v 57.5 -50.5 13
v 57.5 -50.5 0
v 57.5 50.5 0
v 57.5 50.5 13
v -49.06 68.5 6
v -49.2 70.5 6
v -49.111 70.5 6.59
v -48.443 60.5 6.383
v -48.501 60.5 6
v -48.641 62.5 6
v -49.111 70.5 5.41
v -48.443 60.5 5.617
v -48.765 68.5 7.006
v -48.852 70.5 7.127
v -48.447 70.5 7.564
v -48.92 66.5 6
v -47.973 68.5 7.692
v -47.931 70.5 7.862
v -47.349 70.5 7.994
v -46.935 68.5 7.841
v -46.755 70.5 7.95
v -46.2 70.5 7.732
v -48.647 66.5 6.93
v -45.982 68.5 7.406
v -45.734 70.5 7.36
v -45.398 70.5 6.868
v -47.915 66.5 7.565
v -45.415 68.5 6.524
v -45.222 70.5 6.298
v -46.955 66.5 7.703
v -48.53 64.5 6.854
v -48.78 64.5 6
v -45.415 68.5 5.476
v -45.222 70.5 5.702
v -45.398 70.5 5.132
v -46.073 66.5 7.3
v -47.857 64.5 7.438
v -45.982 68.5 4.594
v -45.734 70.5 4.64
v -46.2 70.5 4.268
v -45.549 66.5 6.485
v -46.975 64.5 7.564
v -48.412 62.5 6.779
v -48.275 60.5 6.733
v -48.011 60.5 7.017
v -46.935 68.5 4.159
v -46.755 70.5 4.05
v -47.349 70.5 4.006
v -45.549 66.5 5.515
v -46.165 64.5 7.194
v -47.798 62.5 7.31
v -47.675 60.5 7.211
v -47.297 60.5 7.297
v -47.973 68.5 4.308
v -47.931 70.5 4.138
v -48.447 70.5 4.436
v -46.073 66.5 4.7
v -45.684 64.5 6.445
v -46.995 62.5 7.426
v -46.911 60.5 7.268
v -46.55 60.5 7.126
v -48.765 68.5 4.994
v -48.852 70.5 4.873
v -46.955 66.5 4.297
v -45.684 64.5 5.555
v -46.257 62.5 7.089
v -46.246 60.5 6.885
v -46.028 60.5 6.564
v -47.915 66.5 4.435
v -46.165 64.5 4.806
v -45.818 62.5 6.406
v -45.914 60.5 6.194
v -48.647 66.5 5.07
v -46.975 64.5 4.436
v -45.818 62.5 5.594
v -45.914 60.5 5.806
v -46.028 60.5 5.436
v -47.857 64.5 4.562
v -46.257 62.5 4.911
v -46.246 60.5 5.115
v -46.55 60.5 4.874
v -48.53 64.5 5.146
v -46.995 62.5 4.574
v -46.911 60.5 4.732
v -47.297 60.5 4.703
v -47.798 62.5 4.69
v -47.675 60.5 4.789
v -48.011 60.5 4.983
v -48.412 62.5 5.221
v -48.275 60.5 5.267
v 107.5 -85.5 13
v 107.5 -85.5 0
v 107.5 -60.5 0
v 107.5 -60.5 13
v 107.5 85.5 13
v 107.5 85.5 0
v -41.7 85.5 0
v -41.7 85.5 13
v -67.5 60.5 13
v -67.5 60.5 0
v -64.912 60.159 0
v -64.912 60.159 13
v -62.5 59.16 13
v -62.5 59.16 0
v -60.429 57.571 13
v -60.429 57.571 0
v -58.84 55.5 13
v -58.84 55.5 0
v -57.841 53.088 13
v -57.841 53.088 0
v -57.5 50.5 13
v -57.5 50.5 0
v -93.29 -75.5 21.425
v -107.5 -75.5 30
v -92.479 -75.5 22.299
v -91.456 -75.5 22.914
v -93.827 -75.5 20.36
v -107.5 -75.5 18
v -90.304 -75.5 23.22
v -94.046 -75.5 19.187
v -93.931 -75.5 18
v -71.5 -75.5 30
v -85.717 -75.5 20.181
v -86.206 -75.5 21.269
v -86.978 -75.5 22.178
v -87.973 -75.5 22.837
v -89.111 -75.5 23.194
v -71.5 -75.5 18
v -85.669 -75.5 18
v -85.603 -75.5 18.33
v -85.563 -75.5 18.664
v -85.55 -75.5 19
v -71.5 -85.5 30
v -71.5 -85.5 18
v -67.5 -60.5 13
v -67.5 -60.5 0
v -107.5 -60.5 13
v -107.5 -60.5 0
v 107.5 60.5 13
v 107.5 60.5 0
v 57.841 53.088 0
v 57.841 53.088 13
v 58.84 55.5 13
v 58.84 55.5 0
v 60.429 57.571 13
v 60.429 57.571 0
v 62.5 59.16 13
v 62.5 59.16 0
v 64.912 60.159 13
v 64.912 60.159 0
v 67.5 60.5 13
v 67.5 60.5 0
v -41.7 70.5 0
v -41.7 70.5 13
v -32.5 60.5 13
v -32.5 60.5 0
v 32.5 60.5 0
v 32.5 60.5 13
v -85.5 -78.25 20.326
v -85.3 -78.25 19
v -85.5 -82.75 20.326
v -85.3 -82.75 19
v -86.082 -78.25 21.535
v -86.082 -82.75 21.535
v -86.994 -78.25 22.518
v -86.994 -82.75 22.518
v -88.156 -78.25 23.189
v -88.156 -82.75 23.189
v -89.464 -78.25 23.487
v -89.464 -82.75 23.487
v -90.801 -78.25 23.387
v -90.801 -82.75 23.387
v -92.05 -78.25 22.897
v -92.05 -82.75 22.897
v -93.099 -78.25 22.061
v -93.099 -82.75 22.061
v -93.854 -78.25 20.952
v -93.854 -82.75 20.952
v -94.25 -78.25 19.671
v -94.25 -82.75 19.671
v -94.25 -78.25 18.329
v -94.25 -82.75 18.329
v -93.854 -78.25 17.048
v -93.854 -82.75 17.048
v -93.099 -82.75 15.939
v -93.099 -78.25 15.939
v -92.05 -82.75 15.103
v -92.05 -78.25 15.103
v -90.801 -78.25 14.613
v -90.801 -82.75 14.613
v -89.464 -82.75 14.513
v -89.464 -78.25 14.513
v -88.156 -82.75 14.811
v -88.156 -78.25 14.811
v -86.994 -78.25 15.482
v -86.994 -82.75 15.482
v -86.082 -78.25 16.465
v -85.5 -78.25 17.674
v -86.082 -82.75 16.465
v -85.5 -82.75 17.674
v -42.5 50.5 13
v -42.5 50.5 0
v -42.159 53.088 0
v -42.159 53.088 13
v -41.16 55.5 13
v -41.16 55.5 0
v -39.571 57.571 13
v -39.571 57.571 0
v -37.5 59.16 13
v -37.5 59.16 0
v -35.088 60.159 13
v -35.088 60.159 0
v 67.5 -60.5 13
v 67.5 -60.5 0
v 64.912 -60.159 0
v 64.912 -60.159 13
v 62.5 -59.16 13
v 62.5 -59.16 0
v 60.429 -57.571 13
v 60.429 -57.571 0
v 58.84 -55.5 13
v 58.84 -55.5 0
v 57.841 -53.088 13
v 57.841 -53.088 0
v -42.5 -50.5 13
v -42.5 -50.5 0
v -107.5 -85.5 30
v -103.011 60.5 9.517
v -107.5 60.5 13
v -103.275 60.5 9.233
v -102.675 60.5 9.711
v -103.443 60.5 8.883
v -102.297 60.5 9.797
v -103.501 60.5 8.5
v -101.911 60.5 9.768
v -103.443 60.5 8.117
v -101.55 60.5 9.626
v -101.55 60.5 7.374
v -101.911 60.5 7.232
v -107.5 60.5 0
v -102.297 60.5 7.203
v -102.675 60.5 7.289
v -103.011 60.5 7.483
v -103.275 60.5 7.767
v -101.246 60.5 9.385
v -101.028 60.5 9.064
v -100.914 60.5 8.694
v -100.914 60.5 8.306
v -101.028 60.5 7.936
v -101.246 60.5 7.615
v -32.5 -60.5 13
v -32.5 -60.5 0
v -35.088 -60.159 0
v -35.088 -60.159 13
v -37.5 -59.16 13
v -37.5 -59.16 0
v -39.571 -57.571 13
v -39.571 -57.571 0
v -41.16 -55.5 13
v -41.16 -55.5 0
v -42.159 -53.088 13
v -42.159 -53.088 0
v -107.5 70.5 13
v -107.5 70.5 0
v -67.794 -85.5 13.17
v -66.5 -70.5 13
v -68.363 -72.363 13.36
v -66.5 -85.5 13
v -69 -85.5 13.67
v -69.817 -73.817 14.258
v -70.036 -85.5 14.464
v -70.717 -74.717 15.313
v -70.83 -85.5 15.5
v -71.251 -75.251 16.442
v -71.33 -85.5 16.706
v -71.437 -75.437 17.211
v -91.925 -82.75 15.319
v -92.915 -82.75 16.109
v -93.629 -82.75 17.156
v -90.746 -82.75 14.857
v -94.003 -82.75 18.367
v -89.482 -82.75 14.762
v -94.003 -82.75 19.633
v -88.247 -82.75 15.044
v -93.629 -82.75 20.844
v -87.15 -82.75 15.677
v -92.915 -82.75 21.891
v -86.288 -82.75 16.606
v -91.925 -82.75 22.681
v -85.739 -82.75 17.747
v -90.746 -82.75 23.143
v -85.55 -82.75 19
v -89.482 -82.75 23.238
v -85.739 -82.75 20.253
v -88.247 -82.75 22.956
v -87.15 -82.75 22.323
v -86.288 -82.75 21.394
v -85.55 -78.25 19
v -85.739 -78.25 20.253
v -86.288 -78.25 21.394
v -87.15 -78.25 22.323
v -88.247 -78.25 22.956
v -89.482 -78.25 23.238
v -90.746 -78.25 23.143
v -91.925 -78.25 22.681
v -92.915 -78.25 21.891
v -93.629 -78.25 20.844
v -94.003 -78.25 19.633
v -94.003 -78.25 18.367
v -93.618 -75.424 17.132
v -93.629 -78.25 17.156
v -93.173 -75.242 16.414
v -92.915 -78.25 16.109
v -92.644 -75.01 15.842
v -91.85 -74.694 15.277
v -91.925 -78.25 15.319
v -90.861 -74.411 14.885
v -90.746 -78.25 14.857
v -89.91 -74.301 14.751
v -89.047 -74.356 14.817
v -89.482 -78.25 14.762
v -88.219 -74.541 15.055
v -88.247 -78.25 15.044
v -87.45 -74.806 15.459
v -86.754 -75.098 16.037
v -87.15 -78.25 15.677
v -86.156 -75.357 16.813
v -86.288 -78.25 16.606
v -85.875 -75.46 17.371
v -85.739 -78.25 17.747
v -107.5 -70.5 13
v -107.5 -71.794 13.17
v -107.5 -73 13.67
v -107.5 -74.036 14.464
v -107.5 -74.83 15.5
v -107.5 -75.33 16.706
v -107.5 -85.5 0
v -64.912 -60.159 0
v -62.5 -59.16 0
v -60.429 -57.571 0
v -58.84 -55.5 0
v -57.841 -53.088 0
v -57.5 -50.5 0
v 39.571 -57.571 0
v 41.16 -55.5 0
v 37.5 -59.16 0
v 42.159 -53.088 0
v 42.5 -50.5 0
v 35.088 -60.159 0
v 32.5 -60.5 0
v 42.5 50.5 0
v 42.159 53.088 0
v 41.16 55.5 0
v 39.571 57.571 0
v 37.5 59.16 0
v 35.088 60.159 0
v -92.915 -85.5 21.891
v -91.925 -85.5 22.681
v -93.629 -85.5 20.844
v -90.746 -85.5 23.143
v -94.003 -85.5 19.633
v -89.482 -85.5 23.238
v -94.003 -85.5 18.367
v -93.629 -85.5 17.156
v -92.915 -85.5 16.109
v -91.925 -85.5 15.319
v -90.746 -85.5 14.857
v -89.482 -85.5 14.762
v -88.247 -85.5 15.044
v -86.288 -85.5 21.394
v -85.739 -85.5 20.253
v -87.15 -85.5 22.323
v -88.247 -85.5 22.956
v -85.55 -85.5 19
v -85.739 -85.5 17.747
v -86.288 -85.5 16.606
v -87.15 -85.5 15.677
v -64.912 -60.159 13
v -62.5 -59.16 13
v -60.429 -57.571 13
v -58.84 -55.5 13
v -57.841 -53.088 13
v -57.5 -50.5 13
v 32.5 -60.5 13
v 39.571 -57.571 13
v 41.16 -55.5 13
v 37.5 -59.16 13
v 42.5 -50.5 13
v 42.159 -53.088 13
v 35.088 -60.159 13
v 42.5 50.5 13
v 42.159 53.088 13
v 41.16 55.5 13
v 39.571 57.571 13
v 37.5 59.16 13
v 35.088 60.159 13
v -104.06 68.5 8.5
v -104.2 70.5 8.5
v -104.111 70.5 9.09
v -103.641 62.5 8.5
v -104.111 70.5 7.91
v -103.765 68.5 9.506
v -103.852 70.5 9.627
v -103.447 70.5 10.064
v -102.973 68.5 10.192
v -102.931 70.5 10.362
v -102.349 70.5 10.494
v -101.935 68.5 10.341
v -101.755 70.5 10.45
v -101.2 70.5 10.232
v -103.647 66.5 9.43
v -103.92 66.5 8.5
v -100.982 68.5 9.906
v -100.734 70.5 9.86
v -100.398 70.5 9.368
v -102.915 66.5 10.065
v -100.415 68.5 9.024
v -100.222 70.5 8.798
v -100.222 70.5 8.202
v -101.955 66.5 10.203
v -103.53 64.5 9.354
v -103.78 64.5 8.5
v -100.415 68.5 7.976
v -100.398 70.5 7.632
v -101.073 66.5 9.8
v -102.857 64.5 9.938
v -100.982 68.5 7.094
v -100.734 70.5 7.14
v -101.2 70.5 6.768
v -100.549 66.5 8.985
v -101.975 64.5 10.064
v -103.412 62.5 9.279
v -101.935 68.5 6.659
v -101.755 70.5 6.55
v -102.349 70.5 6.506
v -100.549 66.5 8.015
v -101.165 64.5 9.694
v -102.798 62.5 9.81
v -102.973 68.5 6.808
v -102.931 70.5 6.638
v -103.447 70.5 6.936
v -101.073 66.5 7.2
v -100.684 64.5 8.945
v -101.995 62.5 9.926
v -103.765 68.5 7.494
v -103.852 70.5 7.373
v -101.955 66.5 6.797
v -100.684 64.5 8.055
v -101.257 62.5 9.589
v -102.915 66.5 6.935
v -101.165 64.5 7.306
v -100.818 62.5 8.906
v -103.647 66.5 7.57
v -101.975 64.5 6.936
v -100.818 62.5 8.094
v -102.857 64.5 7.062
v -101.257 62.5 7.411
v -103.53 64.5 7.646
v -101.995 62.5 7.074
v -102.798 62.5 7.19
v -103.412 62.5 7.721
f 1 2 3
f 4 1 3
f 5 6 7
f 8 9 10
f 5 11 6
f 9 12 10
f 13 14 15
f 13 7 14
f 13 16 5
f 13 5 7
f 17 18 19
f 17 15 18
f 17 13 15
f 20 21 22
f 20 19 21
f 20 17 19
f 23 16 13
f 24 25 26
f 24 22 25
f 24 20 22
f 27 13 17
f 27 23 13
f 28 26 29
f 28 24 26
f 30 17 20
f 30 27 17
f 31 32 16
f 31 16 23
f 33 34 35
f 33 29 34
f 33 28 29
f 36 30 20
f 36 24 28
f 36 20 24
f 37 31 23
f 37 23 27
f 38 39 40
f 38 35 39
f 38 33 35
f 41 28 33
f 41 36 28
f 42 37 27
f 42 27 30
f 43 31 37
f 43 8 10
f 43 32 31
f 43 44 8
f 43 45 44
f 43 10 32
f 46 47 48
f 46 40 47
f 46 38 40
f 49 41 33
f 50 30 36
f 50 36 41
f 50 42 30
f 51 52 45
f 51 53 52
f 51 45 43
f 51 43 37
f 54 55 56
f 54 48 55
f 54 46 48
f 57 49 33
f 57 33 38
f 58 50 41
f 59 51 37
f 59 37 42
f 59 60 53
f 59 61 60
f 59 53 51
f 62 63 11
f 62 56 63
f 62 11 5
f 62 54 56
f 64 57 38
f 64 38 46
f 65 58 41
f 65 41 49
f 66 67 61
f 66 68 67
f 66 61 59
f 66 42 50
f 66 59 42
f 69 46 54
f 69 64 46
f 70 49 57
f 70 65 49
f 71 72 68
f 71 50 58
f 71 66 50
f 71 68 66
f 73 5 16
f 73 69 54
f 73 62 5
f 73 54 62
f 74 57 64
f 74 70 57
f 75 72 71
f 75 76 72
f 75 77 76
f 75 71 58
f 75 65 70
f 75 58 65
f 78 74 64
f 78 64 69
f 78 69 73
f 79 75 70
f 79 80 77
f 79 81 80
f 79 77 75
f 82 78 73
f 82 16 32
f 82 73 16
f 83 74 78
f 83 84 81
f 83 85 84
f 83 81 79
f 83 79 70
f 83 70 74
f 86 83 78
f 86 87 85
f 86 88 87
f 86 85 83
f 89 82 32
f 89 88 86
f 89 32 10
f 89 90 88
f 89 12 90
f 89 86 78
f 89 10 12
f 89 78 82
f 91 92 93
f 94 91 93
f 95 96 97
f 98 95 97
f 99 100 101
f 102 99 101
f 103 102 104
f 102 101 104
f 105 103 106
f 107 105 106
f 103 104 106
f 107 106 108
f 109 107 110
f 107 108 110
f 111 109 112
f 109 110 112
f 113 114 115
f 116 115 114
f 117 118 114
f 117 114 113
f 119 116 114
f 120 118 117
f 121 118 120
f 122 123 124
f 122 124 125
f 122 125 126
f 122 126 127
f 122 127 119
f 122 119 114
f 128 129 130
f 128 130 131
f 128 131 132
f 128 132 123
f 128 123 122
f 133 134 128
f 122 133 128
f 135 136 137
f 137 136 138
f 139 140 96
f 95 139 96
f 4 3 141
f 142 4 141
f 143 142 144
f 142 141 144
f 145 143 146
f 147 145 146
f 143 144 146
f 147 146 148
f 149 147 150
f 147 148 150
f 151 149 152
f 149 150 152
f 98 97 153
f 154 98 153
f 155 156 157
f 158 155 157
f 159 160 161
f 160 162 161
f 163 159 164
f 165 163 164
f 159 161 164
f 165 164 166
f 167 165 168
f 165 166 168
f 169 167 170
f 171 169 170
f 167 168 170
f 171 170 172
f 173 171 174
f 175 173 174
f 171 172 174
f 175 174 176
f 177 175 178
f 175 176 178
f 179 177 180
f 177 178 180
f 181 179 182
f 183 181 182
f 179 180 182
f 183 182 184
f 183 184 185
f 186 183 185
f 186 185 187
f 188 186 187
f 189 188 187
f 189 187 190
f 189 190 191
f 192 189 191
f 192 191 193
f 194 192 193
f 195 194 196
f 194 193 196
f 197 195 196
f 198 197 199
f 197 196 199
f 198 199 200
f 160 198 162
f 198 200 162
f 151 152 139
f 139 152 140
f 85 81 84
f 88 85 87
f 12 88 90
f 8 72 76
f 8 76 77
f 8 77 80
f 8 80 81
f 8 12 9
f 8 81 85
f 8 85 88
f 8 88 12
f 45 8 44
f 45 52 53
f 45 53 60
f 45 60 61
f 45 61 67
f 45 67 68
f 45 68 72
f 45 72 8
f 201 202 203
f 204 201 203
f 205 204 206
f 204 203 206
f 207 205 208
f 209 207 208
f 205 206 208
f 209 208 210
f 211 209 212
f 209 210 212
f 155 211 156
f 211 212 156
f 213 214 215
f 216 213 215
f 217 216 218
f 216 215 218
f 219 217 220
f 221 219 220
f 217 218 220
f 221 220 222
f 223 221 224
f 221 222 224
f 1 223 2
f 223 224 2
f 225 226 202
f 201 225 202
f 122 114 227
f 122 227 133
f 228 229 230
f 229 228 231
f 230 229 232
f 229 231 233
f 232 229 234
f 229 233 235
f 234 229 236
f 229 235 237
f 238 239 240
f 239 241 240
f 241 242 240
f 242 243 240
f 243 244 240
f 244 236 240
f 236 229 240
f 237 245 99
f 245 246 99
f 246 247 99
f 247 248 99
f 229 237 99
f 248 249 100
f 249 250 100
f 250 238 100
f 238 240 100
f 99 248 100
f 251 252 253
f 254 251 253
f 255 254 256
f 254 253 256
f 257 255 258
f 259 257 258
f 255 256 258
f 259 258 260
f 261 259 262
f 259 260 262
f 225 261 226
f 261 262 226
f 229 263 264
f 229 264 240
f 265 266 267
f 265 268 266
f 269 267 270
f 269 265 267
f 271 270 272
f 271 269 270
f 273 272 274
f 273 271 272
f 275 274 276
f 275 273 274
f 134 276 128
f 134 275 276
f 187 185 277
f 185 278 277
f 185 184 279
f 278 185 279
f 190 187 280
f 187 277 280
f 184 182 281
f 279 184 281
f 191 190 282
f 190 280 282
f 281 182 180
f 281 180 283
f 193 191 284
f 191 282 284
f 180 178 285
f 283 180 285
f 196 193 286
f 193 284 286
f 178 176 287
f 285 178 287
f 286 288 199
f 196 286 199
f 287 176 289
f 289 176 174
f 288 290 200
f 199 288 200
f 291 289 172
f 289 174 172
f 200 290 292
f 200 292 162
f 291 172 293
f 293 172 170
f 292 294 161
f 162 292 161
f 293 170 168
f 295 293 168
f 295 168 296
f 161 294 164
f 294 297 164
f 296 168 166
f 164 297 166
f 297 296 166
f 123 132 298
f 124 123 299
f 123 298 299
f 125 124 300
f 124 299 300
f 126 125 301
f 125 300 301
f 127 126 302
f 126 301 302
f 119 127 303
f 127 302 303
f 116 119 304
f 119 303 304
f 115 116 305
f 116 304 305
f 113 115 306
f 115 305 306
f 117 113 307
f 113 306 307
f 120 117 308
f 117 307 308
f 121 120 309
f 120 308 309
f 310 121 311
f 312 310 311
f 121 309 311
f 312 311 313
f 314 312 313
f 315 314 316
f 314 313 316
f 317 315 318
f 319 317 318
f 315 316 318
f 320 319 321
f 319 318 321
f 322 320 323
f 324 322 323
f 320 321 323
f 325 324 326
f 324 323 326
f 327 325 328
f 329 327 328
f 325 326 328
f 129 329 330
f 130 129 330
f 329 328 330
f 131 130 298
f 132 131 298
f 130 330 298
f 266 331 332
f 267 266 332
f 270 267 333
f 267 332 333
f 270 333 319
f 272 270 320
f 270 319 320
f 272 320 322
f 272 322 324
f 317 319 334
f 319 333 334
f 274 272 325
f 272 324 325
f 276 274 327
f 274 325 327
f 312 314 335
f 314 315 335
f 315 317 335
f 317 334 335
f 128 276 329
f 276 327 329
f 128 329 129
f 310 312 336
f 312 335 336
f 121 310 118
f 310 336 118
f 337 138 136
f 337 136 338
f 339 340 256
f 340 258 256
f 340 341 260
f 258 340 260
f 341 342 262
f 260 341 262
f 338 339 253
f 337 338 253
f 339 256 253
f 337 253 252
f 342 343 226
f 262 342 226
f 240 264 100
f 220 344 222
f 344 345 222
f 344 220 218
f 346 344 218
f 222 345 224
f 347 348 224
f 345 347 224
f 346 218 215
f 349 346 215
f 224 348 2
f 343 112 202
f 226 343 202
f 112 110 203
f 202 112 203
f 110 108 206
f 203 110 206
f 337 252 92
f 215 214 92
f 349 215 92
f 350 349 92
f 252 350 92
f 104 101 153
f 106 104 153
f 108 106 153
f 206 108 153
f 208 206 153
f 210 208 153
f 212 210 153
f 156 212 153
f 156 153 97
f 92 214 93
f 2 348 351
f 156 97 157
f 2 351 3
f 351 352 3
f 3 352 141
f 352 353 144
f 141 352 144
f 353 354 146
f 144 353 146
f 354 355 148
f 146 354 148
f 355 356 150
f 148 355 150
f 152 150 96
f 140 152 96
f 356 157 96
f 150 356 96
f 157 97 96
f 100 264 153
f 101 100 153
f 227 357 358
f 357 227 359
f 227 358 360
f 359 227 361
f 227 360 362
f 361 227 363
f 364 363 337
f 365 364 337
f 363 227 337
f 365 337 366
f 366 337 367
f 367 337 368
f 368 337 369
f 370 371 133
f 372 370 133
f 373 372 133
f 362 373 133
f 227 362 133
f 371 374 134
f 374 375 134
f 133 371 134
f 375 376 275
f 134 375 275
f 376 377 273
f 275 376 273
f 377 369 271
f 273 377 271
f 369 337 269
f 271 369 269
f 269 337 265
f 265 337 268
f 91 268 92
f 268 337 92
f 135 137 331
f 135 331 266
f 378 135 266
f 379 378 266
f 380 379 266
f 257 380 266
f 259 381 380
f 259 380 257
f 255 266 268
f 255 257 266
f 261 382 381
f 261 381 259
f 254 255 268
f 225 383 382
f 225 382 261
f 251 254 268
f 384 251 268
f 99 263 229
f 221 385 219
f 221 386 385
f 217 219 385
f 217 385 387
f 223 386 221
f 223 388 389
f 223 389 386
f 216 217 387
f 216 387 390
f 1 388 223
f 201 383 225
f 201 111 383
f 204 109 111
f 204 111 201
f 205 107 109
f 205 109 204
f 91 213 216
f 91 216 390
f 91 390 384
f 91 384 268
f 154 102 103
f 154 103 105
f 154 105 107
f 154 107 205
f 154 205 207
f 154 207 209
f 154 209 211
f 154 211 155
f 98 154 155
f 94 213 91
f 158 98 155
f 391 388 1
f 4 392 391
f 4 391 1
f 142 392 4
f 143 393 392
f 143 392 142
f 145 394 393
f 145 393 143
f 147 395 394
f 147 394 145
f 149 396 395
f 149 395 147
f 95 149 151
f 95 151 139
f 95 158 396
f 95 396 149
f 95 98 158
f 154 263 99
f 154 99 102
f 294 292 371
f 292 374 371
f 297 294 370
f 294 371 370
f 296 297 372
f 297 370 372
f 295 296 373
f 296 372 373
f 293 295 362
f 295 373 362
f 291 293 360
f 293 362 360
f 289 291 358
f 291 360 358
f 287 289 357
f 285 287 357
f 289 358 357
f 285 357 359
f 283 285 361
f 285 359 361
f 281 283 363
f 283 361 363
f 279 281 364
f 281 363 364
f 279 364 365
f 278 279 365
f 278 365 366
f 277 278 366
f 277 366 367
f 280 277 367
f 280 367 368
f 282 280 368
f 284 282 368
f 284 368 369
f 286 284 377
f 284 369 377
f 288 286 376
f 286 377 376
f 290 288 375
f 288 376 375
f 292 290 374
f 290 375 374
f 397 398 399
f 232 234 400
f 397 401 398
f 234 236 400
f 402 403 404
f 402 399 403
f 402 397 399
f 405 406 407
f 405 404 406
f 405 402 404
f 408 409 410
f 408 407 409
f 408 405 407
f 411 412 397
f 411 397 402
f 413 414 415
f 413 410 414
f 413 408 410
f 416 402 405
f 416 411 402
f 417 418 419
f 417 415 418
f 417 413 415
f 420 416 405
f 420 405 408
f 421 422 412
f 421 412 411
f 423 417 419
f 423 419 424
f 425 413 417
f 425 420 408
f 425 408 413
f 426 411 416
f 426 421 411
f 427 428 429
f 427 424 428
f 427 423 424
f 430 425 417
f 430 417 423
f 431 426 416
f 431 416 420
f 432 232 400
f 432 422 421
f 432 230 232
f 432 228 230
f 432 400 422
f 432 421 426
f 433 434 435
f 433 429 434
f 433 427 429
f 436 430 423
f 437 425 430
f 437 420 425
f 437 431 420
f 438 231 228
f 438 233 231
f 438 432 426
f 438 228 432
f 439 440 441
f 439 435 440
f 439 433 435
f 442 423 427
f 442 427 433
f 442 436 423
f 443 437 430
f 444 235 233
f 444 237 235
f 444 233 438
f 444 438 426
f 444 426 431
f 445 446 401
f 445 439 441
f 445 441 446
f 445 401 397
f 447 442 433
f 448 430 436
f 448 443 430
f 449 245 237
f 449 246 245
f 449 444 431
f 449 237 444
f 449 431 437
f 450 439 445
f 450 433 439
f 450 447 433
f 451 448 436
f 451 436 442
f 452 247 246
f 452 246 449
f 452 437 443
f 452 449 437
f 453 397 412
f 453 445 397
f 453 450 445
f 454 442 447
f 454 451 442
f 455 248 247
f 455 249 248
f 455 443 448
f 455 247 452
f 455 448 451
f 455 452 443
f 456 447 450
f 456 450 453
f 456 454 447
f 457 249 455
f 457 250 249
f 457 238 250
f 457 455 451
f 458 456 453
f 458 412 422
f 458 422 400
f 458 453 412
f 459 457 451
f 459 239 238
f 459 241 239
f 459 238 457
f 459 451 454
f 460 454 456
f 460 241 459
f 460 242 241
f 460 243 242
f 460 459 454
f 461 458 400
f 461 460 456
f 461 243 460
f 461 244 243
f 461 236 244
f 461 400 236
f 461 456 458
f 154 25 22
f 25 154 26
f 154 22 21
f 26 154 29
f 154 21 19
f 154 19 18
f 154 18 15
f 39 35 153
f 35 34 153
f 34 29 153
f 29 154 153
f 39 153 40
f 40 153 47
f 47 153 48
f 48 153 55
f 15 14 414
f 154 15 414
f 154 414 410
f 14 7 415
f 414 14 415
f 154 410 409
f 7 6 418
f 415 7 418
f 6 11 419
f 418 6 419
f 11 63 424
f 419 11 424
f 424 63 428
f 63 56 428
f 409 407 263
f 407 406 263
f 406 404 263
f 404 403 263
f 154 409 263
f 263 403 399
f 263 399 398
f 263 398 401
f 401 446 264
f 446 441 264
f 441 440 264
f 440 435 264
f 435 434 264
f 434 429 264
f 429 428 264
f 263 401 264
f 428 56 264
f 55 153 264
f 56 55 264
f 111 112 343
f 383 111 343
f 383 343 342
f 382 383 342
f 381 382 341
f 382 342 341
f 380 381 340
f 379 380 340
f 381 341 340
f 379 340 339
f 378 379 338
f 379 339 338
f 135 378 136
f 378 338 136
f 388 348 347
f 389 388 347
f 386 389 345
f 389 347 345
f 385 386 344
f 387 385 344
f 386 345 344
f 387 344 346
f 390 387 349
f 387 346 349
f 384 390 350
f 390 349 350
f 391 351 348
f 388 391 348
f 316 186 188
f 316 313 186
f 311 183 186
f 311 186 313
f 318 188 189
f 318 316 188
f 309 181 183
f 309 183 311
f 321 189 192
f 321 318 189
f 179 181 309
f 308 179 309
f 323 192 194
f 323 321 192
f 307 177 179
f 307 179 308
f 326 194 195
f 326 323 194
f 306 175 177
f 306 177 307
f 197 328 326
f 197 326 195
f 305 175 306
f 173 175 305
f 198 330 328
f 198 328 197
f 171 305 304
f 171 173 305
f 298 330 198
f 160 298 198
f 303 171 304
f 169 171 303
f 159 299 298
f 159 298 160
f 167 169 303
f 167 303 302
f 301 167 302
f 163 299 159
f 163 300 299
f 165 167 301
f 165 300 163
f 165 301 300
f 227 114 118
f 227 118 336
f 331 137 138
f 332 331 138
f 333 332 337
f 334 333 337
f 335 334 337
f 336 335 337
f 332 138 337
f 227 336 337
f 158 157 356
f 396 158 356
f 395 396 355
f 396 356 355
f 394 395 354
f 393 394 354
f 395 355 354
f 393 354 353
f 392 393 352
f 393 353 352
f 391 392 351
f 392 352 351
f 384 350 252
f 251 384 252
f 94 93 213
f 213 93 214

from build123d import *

# Parameters (mm, degrees)
F0_W      = 36
F0_H      = 10
F1_DEPTH  = 13
F3_R      = 2
F4_DEPTH  = 10
F4_TAPER  = 4
F5_DEPTH  = 30
F6_R      = 5
F8_R      = 4.25
F9_DEPTH  = 12.5
F8_R_2    = 4.5
F10_DEPTH = 2.25


# Not quite as in the source:
# - a feature names something its author has since deleted; it is built from what else it names


with BuildPart() as f1:
    # F0 (on Top) → F1 (new body)
    with BuildSketch(Plane.XY):
        with BuildLine():
            Line((-41.7, 85.5), (-41.7, 70.5))
            Line((-41.7, 70.5), (-107.5, 70.5))
            Line((-107.5, 70.5), (-107.5, 60.5))
            Line((-107.5, 60.5), (-67.5, 60.5))
            ThreePointArc((-67.5, 60.5), (-60.4289321881, 57.5710678119), (-57.5, 50.5))
            Line((-57.5, 50.5), (-57.5, -50.5))
            ThreePointArc((-57.5, -50.5), (-60.4289321881, -57.5710678119), (-67.5, -60.5))
            Line((-67.5, -60.5), (-107.5, -60.5))
            Line((-107.5, -60.5), (-107.5, -70.5))
            Line((-107.5, -70.5), (-107.5, -75.5))
            Line((-107.5, -75.5), (-71.5, -75.5))
            Line((-71.5, -75.5), (-71.5, -85.5))
            Line((-71.5, -85.5), (41.7, -85.5))
            Line((41.7, -85.5), (107.5, -85.5))
            Line((107.5, -85.5), (107.5, -70.5))
            Line((107.5, -70.5), (107.5, -60.5))
            Line((107.5, -60.5), (67.5, -60.5))
            ThreePointArc((67.5, -60.5), (60.4289321881, -57.5710678119), (57.5, -50.5))
            Line((57.5, -50.5), (57.5, 50.5))
            ThreePointArc((57.5, 50.5), (60.4289321881, 57.5710678119), (67.5, 60.5))
            Line((67.5, 60.5), (107.5, 60.5))
            Line((107.5, 60.5), (107.5, 70.5))
            Line((107.5, 70.5), (107.5, 85.5))
            Line((107.5, 85.5), (-41.7, 85.5))
        make_face()
        with BuildLine():
            Line((-32.5, 60.5), (32.5, 60.5))
            ThreePointArc((32.5, 60.5), (39.5710678119, 57.5710678119), (42.5, 50.5))
            Line((42.5, 50.5), (42.5, -50.5))
            ThreePointArc((42.5, -50.5), (39.5710678119, -57.5710678119), (32.5, -60.5))
            Line((32.5, -60.5), (-32.5, -60.5))
            ThreePointArc((-32.5, -60.5), (-39.5710678119, -57.5710678119), (-42.5, -50.5))
            Line((-42.5, -50.5), (-42.5, 50.5))
            ThreePointArc((-42.5, 50.5), (-39.5710678119, 57.5710678119), (-32.5, 60.5))
        make_face(mode=Mode.SUBTRACT)
        with Locations((-89.5, -80.5)):
            Rectangle(F0_W, F0_H)
    extrude(amount=F1_DEPTH)

    # F3 (on offset) → F4 (cut)
    with BuildSketch(Plane(origin=(0, 70.5, 0), x_dir=(-1, 0, 0), z_dir=(0, 1, 0))):
        with Locations((47.2, 6)):
            Circle(F3_R)
        with Locations((102.2, 8.5)):
            Circle(F3_R)
    extrude(amount=-F4_DEPTH, taper=F4_TAPER, mode=Mode.SUBTRACT)

    # F0 (on Top) → F5 (join)
    with BuildSketch(Plane.XY):
        with Locations((-89.5, -80.5)):
            Rectangle(F0_W, F0_H)
    extrude(amount=F5_DEPTH)

    # F6
    f6_edges = [f1.edges().sort_by_distance(p)[0] for p in [
        (-89.5, -75.5, 13),
        (-71.5, -80.5, 13),
    ]]
    fillet(f6_edges, radius=F6_R)

    # F8 (on offset) → F9 (cut, symmetric)
    with BuildSketch(Plane.XZ.offset(80.5)):
        with Locations((-89.8, 19)):
            Circle(F8_R)
    extrude(amount=F9_DEPTH, both=True, mode=Mode.SUBTRACT)

    # F8 (on offset) → F10 (cut, symmetric)
    with BuildSketch(Plane.XZ.offset(80.5)):
        with Locations((-89.8, 19)):
            Circle(F8_R_2)
        with Locations((-89.8, 19)):
            Circle(F8_R, mode=Mode.SUBTRACT)
    extrude(amount=F10_DEPTH, both=True, mode=Mode.SUBTRACT)


solid = f1.part
